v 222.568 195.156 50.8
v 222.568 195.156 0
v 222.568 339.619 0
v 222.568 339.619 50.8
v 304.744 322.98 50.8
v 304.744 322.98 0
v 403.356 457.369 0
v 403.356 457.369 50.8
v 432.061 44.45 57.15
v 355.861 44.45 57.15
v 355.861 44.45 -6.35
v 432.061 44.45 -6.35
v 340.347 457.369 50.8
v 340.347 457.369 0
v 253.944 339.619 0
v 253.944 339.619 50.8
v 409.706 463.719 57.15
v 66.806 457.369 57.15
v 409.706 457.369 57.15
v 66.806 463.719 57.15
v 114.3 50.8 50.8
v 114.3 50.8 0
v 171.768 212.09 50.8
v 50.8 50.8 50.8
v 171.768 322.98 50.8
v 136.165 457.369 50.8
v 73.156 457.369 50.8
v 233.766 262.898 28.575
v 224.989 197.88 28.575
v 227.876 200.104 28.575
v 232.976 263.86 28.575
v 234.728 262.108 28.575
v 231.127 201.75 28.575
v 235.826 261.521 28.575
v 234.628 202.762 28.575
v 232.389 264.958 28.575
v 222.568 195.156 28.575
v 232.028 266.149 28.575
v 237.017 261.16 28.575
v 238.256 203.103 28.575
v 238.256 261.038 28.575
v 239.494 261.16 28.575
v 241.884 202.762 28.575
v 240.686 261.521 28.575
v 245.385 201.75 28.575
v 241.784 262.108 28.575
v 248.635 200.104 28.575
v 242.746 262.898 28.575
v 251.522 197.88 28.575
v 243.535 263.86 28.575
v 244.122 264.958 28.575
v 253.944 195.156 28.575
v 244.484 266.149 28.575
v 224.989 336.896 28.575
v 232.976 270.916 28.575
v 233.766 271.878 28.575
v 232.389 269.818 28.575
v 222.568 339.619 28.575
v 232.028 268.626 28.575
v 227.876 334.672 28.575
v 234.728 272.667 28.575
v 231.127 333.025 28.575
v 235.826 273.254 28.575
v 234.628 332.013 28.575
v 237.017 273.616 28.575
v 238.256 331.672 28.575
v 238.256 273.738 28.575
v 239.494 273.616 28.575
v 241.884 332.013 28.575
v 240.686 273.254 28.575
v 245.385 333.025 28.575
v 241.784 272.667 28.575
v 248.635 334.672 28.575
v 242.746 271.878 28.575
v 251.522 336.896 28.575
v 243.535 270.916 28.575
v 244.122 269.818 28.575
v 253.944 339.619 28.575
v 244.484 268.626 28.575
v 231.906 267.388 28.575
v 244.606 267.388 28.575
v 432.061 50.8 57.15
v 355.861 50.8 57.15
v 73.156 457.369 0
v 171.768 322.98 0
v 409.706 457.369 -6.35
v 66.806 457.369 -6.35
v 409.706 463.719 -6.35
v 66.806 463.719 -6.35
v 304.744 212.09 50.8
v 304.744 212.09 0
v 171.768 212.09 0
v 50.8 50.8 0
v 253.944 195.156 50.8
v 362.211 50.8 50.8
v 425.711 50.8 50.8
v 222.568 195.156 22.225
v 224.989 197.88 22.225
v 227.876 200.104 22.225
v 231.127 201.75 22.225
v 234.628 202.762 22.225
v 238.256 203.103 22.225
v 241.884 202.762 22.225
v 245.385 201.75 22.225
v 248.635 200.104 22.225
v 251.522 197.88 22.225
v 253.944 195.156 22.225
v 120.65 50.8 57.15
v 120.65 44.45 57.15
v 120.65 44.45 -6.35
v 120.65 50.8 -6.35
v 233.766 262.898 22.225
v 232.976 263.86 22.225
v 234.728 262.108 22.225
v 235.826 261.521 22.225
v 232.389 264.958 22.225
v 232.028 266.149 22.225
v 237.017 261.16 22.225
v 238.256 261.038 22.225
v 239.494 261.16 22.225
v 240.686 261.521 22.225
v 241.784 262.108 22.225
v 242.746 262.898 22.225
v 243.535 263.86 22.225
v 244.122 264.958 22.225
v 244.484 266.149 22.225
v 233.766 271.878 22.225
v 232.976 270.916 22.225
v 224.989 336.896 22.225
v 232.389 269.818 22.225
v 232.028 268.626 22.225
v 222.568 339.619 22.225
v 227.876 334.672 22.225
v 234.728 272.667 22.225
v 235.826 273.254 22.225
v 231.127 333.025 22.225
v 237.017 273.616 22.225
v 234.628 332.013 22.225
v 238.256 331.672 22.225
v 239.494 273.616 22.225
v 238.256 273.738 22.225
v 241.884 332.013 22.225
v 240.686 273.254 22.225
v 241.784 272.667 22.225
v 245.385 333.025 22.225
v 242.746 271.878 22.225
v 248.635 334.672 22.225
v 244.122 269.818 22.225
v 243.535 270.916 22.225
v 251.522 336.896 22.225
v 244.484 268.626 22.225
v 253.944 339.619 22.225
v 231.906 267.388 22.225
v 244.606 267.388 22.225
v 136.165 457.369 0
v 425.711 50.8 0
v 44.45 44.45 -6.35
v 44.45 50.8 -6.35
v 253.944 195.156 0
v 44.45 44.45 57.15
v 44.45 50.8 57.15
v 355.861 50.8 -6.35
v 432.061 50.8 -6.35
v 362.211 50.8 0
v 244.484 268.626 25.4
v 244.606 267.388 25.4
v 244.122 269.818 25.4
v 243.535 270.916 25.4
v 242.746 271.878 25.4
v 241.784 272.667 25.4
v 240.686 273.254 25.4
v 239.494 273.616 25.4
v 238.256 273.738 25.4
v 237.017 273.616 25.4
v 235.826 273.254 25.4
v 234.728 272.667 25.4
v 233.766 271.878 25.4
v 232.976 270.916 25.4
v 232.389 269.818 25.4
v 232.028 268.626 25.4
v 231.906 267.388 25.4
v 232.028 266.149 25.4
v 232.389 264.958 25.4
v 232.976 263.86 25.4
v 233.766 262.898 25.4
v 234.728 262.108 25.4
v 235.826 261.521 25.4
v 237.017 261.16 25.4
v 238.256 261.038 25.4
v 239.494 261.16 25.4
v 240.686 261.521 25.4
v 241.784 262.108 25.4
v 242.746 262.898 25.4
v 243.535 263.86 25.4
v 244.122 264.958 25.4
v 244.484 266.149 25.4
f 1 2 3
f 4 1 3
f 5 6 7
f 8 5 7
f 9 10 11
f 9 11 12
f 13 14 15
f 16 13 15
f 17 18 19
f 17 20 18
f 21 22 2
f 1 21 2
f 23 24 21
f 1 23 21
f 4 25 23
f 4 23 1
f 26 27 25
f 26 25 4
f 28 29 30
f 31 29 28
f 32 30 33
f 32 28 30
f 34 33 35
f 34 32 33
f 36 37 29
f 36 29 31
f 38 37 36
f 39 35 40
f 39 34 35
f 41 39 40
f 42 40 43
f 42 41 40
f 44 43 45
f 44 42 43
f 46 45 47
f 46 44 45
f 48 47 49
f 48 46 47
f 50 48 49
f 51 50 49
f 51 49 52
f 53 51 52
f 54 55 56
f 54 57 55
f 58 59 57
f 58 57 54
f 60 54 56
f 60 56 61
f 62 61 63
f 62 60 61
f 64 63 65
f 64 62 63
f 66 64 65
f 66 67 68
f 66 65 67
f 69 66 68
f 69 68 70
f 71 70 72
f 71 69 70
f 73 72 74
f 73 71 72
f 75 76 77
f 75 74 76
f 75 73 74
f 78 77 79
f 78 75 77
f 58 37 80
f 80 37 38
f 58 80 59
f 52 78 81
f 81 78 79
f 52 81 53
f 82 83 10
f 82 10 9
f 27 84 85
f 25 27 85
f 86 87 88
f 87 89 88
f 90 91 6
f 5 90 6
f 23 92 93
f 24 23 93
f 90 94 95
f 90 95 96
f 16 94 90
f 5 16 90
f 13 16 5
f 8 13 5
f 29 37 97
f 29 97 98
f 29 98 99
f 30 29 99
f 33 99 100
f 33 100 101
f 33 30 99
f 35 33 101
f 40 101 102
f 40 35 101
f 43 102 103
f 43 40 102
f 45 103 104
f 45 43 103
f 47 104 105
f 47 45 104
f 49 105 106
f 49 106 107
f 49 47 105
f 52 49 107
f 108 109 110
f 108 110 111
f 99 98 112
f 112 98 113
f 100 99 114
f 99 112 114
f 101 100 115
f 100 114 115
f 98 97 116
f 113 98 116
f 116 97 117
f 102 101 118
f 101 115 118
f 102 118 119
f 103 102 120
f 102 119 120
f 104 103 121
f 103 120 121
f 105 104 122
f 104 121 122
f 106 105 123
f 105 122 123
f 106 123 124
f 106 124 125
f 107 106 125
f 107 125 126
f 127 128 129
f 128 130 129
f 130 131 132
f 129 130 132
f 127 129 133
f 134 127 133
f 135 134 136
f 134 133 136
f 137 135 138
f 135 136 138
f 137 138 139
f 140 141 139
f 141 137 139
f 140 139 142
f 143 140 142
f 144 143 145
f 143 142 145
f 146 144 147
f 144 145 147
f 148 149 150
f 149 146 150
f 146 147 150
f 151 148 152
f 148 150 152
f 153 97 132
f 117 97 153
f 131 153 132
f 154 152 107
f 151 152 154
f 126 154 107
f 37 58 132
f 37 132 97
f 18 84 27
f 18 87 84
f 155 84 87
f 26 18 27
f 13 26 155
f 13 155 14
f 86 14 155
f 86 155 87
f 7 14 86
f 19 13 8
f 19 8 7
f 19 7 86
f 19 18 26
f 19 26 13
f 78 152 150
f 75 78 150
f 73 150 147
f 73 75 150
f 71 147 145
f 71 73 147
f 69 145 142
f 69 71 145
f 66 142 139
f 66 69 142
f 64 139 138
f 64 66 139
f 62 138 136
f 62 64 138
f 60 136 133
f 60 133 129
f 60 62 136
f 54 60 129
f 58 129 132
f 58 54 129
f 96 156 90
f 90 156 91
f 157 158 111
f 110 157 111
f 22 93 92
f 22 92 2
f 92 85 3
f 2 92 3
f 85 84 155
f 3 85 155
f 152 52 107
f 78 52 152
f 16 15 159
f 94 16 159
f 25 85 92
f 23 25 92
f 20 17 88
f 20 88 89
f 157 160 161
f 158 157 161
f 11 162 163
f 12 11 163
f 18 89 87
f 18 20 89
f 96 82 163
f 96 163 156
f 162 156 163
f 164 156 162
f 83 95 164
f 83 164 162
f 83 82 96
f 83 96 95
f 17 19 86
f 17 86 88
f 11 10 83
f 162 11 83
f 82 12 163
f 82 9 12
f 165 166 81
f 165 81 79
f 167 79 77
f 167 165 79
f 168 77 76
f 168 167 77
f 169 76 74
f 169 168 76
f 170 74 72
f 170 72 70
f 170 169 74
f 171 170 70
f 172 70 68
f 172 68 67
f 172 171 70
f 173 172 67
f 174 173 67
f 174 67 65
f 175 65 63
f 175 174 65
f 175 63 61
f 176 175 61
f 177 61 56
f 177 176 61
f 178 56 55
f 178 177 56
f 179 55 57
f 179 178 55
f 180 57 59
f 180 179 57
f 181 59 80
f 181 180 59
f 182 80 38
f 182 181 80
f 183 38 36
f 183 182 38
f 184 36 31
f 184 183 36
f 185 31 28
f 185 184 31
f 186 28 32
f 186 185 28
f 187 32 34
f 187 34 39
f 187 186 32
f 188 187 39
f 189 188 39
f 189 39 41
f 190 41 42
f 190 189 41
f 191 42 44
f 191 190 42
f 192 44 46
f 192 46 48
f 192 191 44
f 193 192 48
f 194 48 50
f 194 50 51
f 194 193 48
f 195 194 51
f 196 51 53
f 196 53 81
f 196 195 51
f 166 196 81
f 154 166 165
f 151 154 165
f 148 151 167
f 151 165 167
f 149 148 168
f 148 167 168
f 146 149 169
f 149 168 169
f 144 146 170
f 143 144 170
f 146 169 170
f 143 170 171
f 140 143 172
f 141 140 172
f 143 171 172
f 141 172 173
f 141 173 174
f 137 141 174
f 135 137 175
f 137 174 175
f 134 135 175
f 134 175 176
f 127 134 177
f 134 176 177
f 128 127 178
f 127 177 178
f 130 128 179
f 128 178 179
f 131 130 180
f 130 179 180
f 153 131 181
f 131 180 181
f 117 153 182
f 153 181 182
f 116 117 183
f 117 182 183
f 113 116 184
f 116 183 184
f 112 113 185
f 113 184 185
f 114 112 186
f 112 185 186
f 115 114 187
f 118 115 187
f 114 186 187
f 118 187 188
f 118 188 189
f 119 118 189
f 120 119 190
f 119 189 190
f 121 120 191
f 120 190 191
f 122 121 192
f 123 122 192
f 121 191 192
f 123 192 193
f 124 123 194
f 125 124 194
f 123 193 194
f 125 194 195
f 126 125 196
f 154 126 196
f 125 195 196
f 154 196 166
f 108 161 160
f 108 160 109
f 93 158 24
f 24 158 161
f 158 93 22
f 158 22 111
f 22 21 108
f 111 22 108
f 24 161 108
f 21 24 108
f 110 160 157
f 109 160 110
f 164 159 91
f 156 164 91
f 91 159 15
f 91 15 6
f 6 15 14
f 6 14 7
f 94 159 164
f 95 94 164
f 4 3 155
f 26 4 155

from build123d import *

# Parameters (mm, degrees)
F1_DEPTH      = 50.8
F3_DEPTH      = 57.15
F3_DEPTH_BACK = 6.35
F4_W          = 76.2000850783
F4_H          = 6.35
F4_W_2        = 6.35
F4_W_3        = 63.5000850783
F5_DEPTH      = 6.35
F5_DEPTH_BACK = 57.15
F7_R          = 6.35
F8_DEPTH      = 3.175
F8_DEPTH_BACK = 3.175


with BuildPart() as f1:
    # F0 (on Top) → F1 (new body)
    with BuildSketch(Plane.XY):
        Polygon((136.1647777329, 457.369154054), (73.1556566984, 457.369154054), (171.767788131, 322.9802773173), (171.767788131, 267.5350306093), (171.767788131, 212.0897839013), (50.8, 50.8), (114.3000850783, 50.8), (222.567788131, 195.1564001513), (222.567788131, 339.6189001513), align=None)
    extrude(amount=F1_DEPTH)



with BuildPart() as f1b:
    # F0 (on Top) → F1, piece 2 (new body)
    with BuildSketch(Plane.XY):
        Polygon((304.7435252659, 267.5350306093), (253.9435252659, 267.5350306093), (253.9435252659, 195.1564001513), (362.2112283186, 50.8), (425.7113133969, 50.8), (304.7435252659, 212.0897839013), align=None)
        Polygon((403.3556566984, 457.369154054), (340.3465356639, 457.369154054), (253.9435252659, 339.6189001513), (253.9435252659, 267.5350306093), (304.7435252659, 267.5350306093), (304.7435252659, 322.9802773173), align=None)
    extrude(amount=F1_DEPTH)


with BuildPart() as f1_1:
    add(f1.part)

    add(f1b.part)  # F3 merges F1b
    # F0 (on Top) → F3 (join, two sides)
    with BuildSketch(Plane.XY) as f3_sk:
        Polygon((66.8056566984, 457.369154054), (73.1556566984, 457.369154054), (136.1647777329, 457.369154054), (238.2556566984, 457.369154054), (238.2556566984, 463.719154054), (66.8056566984, 463.719154054), align=None)
        Polygon((238.2556566984, 463.719154054), (238.2556566984, 457.369154054), (340.3465356639, 457.369154054), (403.3556566984, 457.369154054), (409.7056566984, 457.369154054), (409.7056566984, 463.719154054), align=None)
    extrude(amount=F3_DEPTH)
    extrude(f3_sk.sketch, amount=-F3_DEPTH_BACK)

    # F4 (on face) → F5 (join, two sides)
    with BuildSketch(Plane.XY.offset(50.8)) as f5_sk:
        with Locations((82.5500425392, 47.625)):
            Rectangle(F4_W, F4_H)
        with Locations((428.8863133969, 47.625)):
            Rectangle(F4_W_2, F4_H)
        with Locations((393.9612708577, 47.625)):
            Rectangle(F4_W_3, F4_H)
        with Locations((359.0362283186, 47.625)):
            Rectangle(F4_W_2, F4_H)
    extrude(amount=F5_DEPTH)
    extrude(f5_sk.sketch, amount=-F5_DEPTH_BACK)


with BuildPart() as f8:
    # F7 (on offset) → F8 (new body, two sides)
    with BuildSketch(Plane.XY.offset(25.4)) as f8_sk:
        with BuildLine():
            ThreePointArc((253.9435252659, 339.6189001513), (238.2556566984, 331.672130592), (222.567788131, 339.6189001513))
            Line((222.567788131, 339.6189001513), (222.567788131, 195.1564001513))
            ThreePointArc((222.567788131, 195.1564001513), (238.2556566984, 203.1031697107), (253.9435252659, 195.1564001513))
            Line((253.9435252659, 195.1564001513), (253.9435252659, 339.6189001513))
        make_face()
        with Locations((238.2556566984, 267.3876501513)):
            Circle(F7_R, mode=Mode.SUBTRACT)
    extrude(amount=F8_DEPTH)
    extrude(f8_sk.sketch, amount=-F8_DEPTH_BACK)


solid = Compound([f1_1.part, f8.part])
